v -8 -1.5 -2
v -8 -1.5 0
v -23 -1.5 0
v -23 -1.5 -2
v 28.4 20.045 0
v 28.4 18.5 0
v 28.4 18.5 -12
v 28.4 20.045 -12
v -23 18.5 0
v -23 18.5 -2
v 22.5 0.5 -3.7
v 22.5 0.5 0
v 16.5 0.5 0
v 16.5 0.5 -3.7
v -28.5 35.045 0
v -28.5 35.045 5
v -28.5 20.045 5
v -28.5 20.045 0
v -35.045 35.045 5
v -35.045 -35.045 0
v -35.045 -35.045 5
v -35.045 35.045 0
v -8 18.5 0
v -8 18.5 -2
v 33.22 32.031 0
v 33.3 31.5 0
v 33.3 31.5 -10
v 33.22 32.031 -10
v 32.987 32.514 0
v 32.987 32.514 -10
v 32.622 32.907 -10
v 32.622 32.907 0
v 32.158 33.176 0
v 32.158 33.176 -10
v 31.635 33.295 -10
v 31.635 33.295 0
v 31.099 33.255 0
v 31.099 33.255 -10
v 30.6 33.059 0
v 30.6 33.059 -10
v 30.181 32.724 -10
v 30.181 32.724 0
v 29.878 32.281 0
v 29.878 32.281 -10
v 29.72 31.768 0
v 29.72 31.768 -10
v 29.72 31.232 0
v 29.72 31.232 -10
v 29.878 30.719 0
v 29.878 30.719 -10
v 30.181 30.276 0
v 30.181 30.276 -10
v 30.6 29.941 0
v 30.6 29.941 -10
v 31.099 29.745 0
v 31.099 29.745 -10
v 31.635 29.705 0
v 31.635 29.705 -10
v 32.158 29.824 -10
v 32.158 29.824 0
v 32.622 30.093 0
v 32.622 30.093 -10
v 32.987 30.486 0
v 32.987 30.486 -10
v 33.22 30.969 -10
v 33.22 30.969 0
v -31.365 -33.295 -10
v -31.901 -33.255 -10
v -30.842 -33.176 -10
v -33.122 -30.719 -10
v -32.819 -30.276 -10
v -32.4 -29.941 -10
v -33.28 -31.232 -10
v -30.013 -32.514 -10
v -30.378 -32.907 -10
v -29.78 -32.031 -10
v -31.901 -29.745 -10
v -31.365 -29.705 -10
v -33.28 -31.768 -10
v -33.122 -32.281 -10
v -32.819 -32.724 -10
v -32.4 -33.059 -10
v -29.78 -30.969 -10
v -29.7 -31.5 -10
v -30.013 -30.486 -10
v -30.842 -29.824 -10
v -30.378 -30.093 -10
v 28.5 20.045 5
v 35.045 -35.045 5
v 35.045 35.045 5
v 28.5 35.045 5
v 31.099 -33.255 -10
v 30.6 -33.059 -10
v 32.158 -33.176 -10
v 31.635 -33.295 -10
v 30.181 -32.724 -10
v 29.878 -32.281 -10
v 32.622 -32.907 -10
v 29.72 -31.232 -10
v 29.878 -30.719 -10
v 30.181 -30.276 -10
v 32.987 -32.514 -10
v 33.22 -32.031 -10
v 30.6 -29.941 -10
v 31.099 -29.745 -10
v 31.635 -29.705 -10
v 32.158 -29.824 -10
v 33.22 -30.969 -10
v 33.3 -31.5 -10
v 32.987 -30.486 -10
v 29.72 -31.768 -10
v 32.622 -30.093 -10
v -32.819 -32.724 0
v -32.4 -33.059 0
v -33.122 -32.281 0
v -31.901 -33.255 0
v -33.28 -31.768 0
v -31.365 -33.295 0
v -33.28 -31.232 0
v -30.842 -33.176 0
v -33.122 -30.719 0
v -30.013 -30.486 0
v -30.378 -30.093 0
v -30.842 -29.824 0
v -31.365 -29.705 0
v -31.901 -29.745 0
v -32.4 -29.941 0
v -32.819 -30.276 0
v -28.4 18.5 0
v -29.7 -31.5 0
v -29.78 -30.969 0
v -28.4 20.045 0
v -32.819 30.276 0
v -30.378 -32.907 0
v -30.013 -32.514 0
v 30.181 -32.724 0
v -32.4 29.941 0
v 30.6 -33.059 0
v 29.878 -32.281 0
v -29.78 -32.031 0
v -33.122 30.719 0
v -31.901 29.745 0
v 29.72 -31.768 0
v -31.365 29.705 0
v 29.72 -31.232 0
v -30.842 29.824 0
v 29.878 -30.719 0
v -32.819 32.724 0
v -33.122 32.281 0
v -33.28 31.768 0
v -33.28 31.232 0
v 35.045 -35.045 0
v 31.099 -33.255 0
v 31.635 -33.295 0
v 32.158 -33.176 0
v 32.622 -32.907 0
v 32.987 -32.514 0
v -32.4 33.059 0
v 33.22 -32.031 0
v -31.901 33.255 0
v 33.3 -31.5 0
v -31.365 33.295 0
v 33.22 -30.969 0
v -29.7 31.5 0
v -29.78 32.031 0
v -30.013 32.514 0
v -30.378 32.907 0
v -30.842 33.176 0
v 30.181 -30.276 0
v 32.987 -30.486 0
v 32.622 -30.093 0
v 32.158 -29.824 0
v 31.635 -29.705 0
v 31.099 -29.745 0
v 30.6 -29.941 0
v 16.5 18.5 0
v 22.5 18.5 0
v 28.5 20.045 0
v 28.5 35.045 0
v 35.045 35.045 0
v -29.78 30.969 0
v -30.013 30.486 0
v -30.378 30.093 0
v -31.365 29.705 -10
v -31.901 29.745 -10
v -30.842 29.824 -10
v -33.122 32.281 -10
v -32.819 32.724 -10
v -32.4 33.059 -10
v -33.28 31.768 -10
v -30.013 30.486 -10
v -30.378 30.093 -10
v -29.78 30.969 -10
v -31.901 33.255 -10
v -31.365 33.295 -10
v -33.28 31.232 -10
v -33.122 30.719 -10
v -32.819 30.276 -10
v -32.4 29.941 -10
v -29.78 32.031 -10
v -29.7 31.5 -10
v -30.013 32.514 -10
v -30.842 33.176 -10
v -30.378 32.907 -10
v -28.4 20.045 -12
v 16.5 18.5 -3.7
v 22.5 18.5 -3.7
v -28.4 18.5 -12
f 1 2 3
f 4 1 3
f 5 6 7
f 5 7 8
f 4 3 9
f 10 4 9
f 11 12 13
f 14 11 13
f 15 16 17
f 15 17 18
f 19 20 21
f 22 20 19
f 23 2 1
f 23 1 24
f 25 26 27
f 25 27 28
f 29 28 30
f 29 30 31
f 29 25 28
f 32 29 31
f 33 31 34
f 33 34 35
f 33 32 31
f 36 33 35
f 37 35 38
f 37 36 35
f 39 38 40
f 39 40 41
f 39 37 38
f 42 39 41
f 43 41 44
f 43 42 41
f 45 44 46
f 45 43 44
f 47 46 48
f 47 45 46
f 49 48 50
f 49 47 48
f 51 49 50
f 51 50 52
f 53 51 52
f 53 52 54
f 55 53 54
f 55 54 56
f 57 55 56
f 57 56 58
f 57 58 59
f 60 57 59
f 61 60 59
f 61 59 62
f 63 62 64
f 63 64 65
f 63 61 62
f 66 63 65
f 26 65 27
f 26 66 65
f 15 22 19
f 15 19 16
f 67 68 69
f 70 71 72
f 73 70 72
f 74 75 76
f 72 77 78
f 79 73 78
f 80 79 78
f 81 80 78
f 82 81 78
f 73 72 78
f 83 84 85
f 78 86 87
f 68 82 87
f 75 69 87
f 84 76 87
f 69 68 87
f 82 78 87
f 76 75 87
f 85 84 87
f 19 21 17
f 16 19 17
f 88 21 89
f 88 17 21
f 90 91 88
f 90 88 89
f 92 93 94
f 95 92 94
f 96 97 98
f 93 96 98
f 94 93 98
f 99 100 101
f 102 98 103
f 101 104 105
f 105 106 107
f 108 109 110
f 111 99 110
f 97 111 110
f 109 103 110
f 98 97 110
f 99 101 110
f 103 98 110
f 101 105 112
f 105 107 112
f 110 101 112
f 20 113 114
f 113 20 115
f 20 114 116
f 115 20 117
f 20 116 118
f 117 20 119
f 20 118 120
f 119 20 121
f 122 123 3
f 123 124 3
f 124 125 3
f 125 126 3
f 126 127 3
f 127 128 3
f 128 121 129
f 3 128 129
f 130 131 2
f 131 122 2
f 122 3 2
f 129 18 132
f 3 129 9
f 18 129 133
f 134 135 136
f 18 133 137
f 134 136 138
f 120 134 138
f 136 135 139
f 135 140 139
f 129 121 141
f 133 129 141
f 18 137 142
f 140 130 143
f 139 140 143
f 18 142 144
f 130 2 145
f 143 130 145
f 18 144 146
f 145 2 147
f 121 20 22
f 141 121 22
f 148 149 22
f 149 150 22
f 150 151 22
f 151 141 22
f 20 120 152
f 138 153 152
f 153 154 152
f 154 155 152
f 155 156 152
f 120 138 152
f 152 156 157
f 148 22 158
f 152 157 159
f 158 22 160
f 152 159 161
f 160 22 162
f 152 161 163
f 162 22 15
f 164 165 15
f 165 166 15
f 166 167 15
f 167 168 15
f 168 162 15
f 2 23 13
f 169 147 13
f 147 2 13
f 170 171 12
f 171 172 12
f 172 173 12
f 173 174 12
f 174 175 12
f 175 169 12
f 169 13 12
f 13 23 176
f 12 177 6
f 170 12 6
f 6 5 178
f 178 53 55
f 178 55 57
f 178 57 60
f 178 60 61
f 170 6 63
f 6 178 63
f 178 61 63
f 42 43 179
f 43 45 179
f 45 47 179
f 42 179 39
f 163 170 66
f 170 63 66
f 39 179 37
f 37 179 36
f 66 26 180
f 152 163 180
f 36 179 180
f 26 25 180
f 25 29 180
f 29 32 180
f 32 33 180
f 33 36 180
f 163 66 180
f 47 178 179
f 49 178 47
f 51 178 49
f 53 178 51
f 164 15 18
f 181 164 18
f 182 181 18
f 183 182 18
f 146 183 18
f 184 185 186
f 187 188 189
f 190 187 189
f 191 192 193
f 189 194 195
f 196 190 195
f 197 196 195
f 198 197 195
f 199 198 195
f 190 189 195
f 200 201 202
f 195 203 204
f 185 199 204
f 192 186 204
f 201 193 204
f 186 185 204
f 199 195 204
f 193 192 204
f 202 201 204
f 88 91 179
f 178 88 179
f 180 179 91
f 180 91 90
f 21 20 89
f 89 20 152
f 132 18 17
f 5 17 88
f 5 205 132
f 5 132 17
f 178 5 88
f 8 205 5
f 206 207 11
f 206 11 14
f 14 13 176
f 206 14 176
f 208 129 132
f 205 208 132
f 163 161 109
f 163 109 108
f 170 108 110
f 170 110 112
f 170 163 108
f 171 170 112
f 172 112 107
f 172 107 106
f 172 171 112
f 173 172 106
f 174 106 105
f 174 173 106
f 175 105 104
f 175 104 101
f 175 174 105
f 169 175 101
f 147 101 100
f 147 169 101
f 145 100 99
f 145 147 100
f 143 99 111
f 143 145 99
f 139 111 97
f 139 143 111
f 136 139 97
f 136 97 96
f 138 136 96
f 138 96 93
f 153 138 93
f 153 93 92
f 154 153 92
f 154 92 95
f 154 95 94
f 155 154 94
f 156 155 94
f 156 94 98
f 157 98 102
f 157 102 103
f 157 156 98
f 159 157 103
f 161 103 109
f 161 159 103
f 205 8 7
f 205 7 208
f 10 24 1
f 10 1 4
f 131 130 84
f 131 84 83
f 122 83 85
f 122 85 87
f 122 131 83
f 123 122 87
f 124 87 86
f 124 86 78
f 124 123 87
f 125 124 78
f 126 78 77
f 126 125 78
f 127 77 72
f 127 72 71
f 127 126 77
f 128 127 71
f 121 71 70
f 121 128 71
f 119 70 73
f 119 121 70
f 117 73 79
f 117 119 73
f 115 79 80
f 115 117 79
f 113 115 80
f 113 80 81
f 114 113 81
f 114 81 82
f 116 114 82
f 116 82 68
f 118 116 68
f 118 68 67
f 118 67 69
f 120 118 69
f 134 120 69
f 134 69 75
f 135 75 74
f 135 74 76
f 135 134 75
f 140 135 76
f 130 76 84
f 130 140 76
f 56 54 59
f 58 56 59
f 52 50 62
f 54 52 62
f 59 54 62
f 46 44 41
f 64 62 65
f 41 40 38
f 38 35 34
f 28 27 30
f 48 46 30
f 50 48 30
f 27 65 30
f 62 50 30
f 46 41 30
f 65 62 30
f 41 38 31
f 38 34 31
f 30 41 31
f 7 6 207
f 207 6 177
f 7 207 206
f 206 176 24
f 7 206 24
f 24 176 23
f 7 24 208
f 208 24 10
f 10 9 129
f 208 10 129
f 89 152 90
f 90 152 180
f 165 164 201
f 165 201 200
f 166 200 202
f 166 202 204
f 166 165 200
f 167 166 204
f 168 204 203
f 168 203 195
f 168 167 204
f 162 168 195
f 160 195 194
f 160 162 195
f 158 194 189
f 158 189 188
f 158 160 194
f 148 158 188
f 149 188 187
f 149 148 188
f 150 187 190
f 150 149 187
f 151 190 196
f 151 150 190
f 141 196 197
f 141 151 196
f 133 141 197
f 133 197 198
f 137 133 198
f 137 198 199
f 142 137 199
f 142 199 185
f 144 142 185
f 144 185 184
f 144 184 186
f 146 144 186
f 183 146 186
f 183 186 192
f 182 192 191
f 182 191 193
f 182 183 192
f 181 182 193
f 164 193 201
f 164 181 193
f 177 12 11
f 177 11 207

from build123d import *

# Parameters (mm, degrees)
SKETCH_1_W          = 70.09
SKETCH_1_H          = 70.09
EXTRUDE_1_DEPTH     = 5
SKETCH_2_R          = 1.8
EXTRUDE_2_DEPTH     = 10
SKETCH_4_W          = 57
SKETCH_4_H          = 5
CUT_EXTRUDE_2_DEPTH = 15
SKETCH_5_W          = 56.8
SKETCH_5_H          = 1.545
EXTRUDE_3_DEPTH     = 12
SKETCH_6_W          = 6
SKETCH_6_H          = 18
EXTRUDE_4_DEPTH     = 3.7
SKETCH_7_W          = 15
SKETCH_7_H          = 20
EXTRUDE_5_DEPTH     = 2


with BuildPart() as part:
    # 草图1 → 凸台-拉伸1 (new body)
    with BuildSketch(Plane.XY):
        Rectangle(SKETCH_1_W, SKETCH_1_H)
    extrude(amount=EXTRUDE_1_DEPTH)

    # 草图2 → 凸台-拉伸2 (add)
    with BuildSketch(Plane.XY):
        with Locations((31.5, 31.5)):
            Circle(SKETCH_2_R)
        with Locations((31.5, -31.5)):
            Circle(SKETCH_2_R)
        with Locations((-31.5, -31.5)):
            Circle(SKETCH_2_R)
        with Locations((-31.5, 31.5)):
            Circle(SKETCH_2_R)
    extrude(amount=-EXTRUDE_2_DEPTH)

    # 草图4 → 切除-拉伸2 (cut)
    with BuildSketch(Plane(origin=(0, 35.045, 0), x_dir=(1, 0, 0), z_dir=(0, 1, 0))):
        with Locations((0, -2.5)):
            Rectangle(SKETCH_4_W, SKETCH_4_H)
    extrude(amount=-CUT_EXTRUDE_2_DEPTH, mode=Mode.SUBTRACT)

    # 草图5 → 凸台-拉伸3 (add)
    with BuildSketch(Plane(origin=(0, 0, 0), x_dir=(-1, 0, 0), z_dir=(0, 0, -1))):
        with Locations((0, 19.2725)):
            Rectangle(SKETCH_5_W, SKETCH_5_H)
    extrude(amount=EXTRUDE_3_DEPTH)

    # 草图6 → 凸台-拉伸4 (add)
    with BuildSketch(Plane(origin=(0, 0, 0), x_dir=(-1, 0, 0), z_dir=(0, 0, -1))):
        with Locations((-19.5, 9.5)):
            Rectangle(SKETCH_6_W, SKETCH_6_H)
    extrude(amount=EXTRUDE_4_DEPTH)

    # 草图7 → 凸台-拉伸5 (add)
    with BuildSketch(Plane(origin=(0, 0, 0), x_dir=(-1, 0, 0), z_dir=(0, 0, -1))):
        with Locations((15.5, 8.5)):
            Rectangle(SKETCH_7_W, SKETCH_7_H)
    extrude(amount=EXTRUDE_5_DEPTH)


solid = part.part
